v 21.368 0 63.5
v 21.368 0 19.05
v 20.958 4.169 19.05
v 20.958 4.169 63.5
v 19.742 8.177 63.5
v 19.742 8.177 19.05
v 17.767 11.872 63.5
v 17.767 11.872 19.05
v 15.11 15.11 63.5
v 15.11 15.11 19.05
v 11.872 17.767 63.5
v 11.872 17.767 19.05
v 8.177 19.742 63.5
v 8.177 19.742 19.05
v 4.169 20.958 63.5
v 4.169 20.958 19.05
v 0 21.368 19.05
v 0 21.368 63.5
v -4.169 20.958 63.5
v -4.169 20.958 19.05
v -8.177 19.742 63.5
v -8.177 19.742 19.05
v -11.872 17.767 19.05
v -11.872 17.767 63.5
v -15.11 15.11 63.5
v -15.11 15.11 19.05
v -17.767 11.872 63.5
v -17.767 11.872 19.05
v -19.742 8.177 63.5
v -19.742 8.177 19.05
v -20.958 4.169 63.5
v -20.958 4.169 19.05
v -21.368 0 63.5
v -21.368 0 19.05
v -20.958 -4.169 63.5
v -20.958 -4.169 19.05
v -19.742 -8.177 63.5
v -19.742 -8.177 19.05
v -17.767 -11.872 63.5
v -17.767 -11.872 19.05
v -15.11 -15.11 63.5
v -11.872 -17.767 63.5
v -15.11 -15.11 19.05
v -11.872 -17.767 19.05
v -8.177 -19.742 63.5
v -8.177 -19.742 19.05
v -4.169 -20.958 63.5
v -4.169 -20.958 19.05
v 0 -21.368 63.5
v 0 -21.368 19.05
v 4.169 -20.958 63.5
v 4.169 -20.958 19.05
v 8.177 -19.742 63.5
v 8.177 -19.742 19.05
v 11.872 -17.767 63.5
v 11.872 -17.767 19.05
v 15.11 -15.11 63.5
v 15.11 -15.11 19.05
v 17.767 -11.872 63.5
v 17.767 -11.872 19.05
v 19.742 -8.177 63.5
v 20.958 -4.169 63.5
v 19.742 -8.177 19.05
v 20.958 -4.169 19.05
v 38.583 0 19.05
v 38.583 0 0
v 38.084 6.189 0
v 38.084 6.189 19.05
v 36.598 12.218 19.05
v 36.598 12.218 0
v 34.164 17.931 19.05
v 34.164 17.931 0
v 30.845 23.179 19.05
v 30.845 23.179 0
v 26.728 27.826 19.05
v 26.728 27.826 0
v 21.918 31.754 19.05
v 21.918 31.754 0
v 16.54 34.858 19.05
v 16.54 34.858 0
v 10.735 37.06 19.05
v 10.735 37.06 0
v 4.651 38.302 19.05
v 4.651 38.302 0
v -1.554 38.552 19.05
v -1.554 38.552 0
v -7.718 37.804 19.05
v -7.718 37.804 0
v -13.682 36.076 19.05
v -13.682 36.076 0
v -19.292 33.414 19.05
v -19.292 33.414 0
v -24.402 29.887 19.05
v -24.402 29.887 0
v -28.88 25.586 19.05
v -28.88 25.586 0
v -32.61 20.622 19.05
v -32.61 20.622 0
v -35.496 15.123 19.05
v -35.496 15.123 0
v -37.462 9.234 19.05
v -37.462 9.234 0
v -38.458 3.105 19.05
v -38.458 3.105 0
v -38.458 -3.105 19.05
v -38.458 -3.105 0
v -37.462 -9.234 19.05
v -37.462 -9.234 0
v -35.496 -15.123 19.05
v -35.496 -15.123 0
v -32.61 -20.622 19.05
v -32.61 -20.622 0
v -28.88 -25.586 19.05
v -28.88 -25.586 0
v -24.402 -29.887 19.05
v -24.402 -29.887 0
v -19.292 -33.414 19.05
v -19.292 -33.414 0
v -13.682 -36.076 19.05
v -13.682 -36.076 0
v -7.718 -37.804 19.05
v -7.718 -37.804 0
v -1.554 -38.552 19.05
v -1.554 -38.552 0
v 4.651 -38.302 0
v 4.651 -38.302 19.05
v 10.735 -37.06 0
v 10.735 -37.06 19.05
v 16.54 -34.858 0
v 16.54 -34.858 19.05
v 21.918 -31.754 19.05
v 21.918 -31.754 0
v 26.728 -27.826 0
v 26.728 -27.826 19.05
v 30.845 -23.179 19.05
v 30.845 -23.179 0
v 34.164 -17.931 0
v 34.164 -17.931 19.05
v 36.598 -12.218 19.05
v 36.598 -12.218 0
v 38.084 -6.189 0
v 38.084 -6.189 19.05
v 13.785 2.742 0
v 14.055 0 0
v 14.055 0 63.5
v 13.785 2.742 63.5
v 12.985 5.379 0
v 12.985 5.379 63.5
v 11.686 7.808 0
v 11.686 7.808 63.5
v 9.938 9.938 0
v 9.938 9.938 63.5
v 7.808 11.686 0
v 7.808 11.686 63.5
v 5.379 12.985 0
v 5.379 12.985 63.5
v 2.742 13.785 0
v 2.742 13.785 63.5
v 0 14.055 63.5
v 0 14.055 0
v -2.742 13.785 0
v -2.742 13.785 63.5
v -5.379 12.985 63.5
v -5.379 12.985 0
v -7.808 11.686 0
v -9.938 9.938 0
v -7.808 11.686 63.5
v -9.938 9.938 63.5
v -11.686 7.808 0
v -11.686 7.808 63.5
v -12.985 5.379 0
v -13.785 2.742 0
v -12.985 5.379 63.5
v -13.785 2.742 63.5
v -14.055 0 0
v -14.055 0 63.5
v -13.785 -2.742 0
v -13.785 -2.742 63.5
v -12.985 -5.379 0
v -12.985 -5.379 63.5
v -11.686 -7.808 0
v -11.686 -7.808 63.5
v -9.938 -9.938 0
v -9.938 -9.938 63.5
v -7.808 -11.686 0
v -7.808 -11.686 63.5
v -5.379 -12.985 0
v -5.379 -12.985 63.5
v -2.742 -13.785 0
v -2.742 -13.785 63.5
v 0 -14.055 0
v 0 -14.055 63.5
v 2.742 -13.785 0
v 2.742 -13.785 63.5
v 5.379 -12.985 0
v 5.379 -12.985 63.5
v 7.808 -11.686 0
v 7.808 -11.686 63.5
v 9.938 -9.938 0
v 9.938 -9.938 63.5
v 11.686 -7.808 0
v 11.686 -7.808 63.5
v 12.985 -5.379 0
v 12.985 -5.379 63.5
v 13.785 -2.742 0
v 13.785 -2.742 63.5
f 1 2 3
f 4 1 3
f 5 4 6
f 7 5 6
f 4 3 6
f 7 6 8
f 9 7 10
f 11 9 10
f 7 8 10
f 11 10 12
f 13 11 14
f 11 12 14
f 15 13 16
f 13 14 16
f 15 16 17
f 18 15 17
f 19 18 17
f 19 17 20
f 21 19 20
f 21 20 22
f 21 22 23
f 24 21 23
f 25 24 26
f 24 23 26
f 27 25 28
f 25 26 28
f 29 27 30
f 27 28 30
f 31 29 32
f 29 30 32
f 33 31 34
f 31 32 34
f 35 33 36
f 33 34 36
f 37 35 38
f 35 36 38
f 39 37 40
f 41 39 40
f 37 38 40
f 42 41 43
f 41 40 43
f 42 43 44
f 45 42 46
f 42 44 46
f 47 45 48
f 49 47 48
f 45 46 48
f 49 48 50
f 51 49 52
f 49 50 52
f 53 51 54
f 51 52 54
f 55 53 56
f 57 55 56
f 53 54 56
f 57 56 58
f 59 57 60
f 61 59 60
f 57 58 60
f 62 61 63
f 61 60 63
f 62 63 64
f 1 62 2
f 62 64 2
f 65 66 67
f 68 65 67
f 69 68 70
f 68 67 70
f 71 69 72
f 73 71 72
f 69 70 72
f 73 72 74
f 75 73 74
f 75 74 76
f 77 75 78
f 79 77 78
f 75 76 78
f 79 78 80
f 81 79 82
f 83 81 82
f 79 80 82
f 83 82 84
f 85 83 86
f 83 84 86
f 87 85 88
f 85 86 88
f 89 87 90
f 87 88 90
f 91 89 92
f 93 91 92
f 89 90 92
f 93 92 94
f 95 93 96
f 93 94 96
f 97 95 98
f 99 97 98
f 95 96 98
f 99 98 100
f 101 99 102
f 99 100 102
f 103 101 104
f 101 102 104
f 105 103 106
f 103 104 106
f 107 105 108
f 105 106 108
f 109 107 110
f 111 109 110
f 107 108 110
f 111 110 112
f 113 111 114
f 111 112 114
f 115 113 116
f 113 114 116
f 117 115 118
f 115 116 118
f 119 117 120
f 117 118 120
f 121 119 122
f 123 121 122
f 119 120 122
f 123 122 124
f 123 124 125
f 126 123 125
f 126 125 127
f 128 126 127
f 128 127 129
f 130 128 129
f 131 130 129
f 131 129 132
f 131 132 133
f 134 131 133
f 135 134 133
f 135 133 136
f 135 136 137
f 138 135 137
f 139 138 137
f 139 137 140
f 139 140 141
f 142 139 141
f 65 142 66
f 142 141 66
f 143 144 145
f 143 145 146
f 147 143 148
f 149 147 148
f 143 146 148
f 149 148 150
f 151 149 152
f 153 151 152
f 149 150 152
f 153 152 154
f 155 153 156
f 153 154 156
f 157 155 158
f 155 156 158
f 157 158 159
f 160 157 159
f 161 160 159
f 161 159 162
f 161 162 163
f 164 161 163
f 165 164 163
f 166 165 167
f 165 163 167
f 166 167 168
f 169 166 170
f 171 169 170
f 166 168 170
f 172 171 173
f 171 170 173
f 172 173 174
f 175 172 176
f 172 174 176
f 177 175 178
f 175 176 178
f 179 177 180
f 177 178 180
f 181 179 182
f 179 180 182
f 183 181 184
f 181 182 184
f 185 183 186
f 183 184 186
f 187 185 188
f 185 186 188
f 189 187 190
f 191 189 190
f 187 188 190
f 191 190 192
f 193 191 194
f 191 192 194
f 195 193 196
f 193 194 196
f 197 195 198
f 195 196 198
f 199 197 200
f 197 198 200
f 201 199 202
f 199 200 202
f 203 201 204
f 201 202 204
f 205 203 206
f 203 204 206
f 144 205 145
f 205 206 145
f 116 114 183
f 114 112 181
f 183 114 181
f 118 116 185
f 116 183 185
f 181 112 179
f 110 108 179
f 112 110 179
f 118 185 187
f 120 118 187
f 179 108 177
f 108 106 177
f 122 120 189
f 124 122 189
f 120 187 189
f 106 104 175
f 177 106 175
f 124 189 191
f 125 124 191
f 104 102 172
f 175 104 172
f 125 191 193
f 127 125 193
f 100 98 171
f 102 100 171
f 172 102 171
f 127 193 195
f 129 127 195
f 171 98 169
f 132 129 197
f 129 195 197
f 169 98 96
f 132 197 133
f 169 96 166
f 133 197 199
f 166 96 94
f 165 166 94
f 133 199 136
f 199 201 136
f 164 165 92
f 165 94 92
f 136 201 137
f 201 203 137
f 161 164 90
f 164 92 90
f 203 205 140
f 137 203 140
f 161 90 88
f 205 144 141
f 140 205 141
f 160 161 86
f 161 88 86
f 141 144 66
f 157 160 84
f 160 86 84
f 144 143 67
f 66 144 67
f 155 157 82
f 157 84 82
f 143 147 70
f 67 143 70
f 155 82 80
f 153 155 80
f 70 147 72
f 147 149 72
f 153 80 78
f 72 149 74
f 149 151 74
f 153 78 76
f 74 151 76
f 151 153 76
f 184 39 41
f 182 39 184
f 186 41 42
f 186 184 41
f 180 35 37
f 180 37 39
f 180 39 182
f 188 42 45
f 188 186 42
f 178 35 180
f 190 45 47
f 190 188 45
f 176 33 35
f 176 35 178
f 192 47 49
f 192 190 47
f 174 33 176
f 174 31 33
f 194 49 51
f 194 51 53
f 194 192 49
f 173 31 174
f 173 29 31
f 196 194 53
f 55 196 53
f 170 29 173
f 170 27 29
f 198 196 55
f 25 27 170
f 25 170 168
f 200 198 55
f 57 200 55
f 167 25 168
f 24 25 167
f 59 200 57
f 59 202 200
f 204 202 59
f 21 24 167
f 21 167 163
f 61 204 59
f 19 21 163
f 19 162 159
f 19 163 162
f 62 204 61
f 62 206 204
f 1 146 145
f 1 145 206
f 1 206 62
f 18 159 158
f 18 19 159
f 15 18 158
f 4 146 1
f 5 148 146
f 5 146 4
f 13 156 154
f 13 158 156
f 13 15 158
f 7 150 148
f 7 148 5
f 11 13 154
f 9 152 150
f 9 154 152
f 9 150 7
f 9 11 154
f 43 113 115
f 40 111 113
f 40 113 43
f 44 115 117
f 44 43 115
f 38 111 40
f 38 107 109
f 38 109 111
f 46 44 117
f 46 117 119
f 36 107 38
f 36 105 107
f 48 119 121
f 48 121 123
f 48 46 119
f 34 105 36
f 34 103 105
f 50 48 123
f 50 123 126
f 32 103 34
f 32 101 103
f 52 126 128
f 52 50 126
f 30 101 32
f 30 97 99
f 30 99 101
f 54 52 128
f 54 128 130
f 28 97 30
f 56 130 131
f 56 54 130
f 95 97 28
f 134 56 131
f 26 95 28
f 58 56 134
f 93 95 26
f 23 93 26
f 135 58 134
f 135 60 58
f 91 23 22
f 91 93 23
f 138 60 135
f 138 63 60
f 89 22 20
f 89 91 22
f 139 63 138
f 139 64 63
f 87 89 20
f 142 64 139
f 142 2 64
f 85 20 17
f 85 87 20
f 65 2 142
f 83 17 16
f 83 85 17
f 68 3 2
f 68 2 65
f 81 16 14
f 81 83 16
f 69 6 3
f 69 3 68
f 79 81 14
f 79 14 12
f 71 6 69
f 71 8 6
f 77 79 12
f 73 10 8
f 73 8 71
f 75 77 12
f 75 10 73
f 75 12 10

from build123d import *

# Parameters (mm, degrees)
F0_R     = 38.583475
F1_DEPTH = 19.05
F2_R     = 21.368169
F3_DEPTH = 44.45
F4_R     = 14.054868
F5_DEPTH = 63.5
F6_DEPTH = 63.5


with BuildPart() as f1:
    # F0 (on Top) → F1 (new body)
    with BuildSketch(Plane.XY):
        Circle(F0_R)
    extrude(amount=F1_DEPTH)

    # F2 (on face) → F3 (join)
    with BuildSketch(Plane.XY.offset(19.05)):
        Circle(F2_R)
    extrude(amount=F3_DEPTH)

    # F4 (on face) → F5 (join)
    with BuildSketch(Plane.XY.offset(63.5)):
        Circle(F4_R)
    extrude(amount=-F5_DEPTH)

    # F4 (on face) → F6 (cut)
    with BuildSketch(Plane.XY.offset(63.5)):
        Circle(F4_R)
    extrude(amount=-F6_DEPTH, mode=Mode.SUBTRACT)


solid = f1.part
